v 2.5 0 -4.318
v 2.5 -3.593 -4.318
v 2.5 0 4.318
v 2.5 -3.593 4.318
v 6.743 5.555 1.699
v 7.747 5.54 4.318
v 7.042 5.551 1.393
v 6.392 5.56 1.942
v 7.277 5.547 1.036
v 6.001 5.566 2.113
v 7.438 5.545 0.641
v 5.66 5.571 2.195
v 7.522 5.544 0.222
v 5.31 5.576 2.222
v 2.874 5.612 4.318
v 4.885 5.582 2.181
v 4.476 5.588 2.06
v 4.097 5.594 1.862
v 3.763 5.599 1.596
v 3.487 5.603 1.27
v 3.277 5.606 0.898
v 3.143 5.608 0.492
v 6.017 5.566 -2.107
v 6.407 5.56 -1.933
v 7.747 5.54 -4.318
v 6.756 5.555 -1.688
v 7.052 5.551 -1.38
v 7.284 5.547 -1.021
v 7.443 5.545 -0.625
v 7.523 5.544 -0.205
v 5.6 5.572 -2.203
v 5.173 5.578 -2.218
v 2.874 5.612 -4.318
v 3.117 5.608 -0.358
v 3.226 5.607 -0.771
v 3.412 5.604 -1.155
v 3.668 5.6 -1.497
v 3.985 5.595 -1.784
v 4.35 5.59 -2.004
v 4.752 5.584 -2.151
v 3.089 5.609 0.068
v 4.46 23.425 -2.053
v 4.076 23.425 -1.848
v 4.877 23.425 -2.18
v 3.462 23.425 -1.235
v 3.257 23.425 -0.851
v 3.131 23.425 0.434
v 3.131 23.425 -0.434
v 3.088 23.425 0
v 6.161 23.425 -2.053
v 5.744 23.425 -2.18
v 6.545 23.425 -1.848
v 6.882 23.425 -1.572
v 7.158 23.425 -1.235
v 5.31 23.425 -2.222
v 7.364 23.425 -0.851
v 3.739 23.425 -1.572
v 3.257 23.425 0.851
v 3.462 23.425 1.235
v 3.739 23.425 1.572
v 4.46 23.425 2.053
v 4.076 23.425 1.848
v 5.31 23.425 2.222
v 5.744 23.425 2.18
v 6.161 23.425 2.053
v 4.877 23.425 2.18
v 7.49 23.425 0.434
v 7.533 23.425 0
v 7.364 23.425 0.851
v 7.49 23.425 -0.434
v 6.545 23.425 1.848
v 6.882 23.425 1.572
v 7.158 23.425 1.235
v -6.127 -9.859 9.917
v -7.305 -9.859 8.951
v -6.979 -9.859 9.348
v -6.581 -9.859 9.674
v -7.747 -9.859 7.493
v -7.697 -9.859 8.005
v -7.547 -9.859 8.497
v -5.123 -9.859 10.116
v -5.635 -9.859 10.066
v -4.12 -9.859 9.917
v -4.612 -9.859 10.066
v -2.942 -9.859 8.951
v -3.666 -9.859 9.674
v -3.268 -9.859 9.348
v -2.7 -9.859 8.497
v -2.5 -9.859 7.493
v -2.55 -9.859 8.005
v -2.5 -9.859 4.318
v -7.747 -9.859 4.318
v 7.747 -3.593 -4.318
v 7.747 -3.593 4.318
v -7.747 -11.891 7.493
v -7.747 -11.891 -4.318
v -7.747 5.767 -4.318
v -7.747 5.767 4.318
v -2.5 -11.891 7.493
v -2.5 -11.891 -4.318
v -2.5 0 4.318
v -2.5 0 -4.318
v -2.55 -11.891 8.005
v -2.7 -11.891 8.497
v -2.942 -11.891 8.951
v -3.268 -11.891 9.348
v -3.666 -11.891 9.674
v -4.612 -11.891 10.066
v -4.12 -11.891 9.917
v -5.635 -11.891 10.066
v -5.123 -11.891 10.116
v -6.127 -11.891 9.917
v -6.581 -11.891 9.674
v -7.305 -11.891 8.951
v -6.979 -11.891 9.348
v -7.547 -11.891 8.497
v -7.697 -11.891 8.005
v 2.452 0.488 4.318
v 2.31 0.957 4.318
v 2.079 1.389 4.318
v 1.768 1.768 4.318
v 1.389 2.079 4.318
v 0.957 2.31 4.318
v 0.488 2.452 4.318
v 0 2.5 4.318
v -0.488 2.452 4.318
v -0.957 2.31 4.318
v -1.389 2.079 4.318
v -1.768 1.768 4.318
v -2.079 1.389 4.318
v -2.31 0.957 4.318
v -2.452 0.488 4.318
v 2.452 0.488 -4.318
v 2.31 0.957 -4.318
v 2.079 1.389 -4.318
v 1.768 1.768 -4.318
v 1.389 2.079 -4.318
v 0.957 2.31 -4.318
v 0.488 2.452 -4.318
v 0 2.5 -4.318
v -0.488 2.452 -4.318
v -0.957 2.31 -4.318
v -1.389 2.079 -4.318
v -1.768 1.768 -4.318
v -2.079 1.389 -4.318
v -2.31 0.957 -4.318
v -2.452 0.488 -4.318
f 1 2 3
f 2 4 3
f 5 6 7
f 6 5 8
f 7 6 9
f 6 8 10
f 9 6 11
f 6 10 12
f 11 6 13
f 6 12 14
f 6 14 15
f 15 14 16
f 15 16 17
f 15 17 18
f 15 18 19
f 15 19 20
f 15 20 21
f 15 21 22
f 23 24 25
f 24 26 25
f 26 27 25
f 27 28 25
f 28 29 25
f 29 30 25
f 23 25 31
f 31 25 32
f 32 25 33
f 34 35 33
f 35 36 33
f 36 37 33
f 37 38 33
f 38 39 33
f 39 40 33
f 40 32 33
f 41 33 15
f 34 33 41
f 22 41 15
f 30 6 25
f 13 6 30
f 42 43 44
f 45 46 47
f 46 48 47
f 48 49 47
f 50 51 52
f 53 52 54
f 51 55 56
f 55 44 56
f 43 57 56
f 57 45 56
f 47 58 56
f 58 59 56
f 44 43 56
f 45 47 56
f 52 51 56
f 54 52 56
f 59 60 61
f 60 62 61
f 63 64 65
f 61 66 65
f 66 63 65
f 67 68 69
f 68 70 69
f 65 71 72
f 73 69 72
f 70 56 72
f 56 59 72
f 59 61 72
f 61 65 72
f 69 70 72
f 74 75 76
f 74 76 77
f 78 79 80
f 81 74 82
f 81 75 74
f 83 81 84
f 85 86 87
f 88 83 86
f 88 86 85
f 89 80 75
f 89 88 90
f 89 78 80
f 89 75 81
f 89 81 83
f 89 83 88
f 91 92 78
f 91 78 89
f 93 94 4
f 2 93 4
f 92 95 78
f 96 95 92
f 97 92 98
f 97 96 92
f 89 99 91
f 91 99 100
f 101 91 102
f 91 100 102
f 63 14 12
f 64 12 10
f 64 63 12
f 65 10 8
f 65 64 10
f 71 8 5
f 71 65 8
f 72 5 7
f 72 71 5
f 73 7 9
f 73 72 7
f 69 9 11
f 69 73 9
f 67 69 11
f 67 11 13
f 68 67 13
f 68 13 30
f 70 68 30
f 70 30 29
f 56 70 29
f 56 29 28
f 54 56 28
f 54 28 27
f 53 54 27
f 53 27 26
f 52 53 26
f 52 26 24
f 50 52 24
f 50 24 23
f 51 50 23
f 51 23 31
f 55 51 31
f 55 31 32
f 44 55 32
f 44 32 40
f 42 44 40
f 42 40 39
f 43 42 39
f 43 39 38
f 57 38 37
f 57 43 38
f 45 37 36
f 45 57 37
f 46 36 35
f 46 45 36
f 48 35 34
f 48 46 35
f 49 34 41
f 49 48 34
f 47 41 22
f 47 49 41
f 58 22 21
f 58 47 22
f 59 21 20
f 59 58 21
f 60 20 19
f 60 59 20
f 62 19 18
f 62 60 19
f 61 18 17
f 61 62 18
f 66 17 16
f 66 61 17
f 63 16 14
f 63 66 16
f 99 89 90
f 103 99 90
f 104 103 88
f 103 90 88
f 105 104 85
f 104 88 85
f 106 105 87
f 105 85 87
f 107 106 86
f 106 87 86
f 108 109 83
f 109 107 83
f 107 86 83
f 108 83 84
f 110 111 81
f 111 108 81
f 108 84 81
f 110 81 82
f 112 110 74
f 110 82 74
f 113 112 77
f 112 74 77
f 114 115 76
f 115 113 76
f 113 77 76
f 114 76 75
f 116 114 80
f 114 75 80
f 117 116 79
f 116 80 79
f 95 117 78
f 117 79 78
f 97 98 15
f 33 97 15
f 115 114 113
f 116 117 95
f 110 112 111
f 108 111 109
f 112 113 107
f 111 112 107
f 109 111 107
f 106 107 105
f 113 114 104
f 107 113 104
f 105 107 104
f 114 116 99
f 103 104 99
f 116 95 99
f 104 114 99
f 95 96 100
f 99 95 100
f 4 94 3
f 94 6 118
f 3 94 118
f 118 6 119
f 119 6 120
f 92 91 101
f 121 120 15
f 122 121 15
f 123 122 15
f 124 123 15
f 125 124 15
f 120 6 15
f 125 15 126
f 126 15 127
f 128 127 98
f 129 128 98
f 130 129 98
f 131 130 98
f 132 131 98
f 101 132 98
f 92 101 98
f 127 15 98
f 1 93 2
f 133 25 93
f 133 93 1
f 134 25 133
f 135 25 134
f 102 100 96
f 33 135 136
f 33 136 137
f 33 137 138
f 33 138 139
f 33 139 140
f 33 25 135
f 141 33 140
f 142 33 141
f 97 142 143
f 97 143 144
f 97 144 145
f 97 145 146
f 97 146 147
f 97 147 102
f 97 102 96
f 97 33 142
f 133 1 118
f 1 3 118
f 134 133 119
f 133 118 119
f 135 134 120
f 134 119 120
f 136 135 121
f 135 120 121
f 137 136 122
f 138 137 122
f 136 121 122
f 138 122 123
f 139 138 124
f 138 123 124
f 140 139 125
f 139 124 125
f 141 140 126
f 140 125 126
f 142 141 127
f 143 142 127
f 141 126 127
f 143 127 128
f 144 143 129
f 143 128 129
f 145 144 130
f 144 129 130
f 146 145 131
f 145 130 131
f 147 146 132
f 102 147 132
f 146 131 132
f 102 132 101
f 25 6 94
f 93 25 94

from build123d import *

# Parameters (mm, degrees)
BOSS_EXTRUDE1_DEPTH = 4.318
CUT_EXTRUDE1_REACH  = 38.412
SKETCH2_W           = 8.541760295
SKETCH2_H           = 11.079108592
SKETCH2_R           = 2.2225
SKETCH3_W           = 5.247
SKETCH3_H           = 2.032
BOSS_EXTRUDE2_DEPTH = 6.35
CUT_EXTRUDE2_DEPTH  = 27.880358119


with BuildPart() as part:
    # Sketch1 → Boss-Extrude1 (new, symmetric)
    with BuildSketch(Plane.XY):
        with BuildLine():
            Line((7.747, -3.592967768), (2.5, -3.592967768))
            Line((2.5, -3.592967768), (2.5, 0))
            ThreePointArc((2.5, 0), (0, 2.5), (-2.5, 0))
            Line((-2.5, 0), (-2.5, -11.890523987))
            Line((-2.5, -11.890523987), (-7.747, -11.890523987))
            Line((-7.747, -11.890523987), (-7.747, 5.76724639))
            Line((-7.747, 5.76724639), (2.873732949, 5.611740799))
            Line((2.873732949, 5.611740799), (2.873732949, 23.425016961))
            Line((2.873732949, 23.425016961), (7.747, 23.425016961))
            Line((7.747, 23.425016961), (7.747, -3.592967768))
        make_face()
    extrude(amount=BOSS_EXTRUDE1_DEPTH, both=True)

    # Cut-Extrude1: up to this plane
    cut_extrude1_end = Plane(origin=(2.873732949, 5.611740799, 4.318), z_dir=(-0.014640131281330963, -0.9998928275350643, 0))
    # Sketch2 → Cut-Extrude1 (cut, up to the surface)
    with BuildSketch(Plane(origin=(0, 23.425016961, 0), x_dir=(1, 0, 0), z_dir=(0, 1, 0)), mode=Mode.PRIVATE) as cut_extrude1_sk1:
        with Locations((5.587976973, 0.096845355)):
            Rectangle(SKETCH2_W, SKETCH2_H)
        with Locations(Location((5.310366443, 0, 0), (0, 0, 270))):
            Circle(SKETCH2_R, mode=Mode.SUBTRACT)
    cut_extrude1_tool1 = split(extrude(cut_extrude1_sk1.sketch, amount=-CUT_EXTRUDE1_REACH, mode=Mode.PRIVATE), bisect_by=cut_extrude1_end, keep=Keep.BOTH, mode=Mode.PRIVATE)
    add(cut_extrude1_tool1.solids().sort_by_distance((5.587977, 23.425017, -5.496504))[0], mode=Mode.SUBTRACT)

    # Sketch3 → Boss-Extrude2 (add)
    with BuildSketch(Plane.XY.offset(4.318)):
        with Locations((-5.1235, -10.874523987)):
            Rectangle(SKETCH3_W, SKETCH3_H)
    extrude(amount=BOSS_EXTRUDE2_DEPTH)

    # Sketch4 → Cut-Extrude2 (cut, through all)
    with BuildSketch(Plane(origin=(0, 0, 0), x_dir=(1, 0, 0), z_dir=(0, 1, 0))):
        with BuildLine():
            Line((-7.747, -7.493), (-9.552186856, -7.493))
            Line((-9.552186856, -7.493), (-9.552186856, -11.539215141))
            Line((-9.552186856, -11.539215141), (-1.066763887, -11.539215141))
            Line((-1.066763887, -11.539215141), (-1.066763887, -7.493))
            Line((-1.066763887, -7.493), (-2.5, -7.493))
            ThreePointArc((-2.5, -7.493), (-5.1235, -10.1165), (-7.747, -7.493))
        make_face()
    extrude(amount=-CUT_EXTRUDE2_DEPTH, mode=Mode.SUBTRACT)


solid = part.part
